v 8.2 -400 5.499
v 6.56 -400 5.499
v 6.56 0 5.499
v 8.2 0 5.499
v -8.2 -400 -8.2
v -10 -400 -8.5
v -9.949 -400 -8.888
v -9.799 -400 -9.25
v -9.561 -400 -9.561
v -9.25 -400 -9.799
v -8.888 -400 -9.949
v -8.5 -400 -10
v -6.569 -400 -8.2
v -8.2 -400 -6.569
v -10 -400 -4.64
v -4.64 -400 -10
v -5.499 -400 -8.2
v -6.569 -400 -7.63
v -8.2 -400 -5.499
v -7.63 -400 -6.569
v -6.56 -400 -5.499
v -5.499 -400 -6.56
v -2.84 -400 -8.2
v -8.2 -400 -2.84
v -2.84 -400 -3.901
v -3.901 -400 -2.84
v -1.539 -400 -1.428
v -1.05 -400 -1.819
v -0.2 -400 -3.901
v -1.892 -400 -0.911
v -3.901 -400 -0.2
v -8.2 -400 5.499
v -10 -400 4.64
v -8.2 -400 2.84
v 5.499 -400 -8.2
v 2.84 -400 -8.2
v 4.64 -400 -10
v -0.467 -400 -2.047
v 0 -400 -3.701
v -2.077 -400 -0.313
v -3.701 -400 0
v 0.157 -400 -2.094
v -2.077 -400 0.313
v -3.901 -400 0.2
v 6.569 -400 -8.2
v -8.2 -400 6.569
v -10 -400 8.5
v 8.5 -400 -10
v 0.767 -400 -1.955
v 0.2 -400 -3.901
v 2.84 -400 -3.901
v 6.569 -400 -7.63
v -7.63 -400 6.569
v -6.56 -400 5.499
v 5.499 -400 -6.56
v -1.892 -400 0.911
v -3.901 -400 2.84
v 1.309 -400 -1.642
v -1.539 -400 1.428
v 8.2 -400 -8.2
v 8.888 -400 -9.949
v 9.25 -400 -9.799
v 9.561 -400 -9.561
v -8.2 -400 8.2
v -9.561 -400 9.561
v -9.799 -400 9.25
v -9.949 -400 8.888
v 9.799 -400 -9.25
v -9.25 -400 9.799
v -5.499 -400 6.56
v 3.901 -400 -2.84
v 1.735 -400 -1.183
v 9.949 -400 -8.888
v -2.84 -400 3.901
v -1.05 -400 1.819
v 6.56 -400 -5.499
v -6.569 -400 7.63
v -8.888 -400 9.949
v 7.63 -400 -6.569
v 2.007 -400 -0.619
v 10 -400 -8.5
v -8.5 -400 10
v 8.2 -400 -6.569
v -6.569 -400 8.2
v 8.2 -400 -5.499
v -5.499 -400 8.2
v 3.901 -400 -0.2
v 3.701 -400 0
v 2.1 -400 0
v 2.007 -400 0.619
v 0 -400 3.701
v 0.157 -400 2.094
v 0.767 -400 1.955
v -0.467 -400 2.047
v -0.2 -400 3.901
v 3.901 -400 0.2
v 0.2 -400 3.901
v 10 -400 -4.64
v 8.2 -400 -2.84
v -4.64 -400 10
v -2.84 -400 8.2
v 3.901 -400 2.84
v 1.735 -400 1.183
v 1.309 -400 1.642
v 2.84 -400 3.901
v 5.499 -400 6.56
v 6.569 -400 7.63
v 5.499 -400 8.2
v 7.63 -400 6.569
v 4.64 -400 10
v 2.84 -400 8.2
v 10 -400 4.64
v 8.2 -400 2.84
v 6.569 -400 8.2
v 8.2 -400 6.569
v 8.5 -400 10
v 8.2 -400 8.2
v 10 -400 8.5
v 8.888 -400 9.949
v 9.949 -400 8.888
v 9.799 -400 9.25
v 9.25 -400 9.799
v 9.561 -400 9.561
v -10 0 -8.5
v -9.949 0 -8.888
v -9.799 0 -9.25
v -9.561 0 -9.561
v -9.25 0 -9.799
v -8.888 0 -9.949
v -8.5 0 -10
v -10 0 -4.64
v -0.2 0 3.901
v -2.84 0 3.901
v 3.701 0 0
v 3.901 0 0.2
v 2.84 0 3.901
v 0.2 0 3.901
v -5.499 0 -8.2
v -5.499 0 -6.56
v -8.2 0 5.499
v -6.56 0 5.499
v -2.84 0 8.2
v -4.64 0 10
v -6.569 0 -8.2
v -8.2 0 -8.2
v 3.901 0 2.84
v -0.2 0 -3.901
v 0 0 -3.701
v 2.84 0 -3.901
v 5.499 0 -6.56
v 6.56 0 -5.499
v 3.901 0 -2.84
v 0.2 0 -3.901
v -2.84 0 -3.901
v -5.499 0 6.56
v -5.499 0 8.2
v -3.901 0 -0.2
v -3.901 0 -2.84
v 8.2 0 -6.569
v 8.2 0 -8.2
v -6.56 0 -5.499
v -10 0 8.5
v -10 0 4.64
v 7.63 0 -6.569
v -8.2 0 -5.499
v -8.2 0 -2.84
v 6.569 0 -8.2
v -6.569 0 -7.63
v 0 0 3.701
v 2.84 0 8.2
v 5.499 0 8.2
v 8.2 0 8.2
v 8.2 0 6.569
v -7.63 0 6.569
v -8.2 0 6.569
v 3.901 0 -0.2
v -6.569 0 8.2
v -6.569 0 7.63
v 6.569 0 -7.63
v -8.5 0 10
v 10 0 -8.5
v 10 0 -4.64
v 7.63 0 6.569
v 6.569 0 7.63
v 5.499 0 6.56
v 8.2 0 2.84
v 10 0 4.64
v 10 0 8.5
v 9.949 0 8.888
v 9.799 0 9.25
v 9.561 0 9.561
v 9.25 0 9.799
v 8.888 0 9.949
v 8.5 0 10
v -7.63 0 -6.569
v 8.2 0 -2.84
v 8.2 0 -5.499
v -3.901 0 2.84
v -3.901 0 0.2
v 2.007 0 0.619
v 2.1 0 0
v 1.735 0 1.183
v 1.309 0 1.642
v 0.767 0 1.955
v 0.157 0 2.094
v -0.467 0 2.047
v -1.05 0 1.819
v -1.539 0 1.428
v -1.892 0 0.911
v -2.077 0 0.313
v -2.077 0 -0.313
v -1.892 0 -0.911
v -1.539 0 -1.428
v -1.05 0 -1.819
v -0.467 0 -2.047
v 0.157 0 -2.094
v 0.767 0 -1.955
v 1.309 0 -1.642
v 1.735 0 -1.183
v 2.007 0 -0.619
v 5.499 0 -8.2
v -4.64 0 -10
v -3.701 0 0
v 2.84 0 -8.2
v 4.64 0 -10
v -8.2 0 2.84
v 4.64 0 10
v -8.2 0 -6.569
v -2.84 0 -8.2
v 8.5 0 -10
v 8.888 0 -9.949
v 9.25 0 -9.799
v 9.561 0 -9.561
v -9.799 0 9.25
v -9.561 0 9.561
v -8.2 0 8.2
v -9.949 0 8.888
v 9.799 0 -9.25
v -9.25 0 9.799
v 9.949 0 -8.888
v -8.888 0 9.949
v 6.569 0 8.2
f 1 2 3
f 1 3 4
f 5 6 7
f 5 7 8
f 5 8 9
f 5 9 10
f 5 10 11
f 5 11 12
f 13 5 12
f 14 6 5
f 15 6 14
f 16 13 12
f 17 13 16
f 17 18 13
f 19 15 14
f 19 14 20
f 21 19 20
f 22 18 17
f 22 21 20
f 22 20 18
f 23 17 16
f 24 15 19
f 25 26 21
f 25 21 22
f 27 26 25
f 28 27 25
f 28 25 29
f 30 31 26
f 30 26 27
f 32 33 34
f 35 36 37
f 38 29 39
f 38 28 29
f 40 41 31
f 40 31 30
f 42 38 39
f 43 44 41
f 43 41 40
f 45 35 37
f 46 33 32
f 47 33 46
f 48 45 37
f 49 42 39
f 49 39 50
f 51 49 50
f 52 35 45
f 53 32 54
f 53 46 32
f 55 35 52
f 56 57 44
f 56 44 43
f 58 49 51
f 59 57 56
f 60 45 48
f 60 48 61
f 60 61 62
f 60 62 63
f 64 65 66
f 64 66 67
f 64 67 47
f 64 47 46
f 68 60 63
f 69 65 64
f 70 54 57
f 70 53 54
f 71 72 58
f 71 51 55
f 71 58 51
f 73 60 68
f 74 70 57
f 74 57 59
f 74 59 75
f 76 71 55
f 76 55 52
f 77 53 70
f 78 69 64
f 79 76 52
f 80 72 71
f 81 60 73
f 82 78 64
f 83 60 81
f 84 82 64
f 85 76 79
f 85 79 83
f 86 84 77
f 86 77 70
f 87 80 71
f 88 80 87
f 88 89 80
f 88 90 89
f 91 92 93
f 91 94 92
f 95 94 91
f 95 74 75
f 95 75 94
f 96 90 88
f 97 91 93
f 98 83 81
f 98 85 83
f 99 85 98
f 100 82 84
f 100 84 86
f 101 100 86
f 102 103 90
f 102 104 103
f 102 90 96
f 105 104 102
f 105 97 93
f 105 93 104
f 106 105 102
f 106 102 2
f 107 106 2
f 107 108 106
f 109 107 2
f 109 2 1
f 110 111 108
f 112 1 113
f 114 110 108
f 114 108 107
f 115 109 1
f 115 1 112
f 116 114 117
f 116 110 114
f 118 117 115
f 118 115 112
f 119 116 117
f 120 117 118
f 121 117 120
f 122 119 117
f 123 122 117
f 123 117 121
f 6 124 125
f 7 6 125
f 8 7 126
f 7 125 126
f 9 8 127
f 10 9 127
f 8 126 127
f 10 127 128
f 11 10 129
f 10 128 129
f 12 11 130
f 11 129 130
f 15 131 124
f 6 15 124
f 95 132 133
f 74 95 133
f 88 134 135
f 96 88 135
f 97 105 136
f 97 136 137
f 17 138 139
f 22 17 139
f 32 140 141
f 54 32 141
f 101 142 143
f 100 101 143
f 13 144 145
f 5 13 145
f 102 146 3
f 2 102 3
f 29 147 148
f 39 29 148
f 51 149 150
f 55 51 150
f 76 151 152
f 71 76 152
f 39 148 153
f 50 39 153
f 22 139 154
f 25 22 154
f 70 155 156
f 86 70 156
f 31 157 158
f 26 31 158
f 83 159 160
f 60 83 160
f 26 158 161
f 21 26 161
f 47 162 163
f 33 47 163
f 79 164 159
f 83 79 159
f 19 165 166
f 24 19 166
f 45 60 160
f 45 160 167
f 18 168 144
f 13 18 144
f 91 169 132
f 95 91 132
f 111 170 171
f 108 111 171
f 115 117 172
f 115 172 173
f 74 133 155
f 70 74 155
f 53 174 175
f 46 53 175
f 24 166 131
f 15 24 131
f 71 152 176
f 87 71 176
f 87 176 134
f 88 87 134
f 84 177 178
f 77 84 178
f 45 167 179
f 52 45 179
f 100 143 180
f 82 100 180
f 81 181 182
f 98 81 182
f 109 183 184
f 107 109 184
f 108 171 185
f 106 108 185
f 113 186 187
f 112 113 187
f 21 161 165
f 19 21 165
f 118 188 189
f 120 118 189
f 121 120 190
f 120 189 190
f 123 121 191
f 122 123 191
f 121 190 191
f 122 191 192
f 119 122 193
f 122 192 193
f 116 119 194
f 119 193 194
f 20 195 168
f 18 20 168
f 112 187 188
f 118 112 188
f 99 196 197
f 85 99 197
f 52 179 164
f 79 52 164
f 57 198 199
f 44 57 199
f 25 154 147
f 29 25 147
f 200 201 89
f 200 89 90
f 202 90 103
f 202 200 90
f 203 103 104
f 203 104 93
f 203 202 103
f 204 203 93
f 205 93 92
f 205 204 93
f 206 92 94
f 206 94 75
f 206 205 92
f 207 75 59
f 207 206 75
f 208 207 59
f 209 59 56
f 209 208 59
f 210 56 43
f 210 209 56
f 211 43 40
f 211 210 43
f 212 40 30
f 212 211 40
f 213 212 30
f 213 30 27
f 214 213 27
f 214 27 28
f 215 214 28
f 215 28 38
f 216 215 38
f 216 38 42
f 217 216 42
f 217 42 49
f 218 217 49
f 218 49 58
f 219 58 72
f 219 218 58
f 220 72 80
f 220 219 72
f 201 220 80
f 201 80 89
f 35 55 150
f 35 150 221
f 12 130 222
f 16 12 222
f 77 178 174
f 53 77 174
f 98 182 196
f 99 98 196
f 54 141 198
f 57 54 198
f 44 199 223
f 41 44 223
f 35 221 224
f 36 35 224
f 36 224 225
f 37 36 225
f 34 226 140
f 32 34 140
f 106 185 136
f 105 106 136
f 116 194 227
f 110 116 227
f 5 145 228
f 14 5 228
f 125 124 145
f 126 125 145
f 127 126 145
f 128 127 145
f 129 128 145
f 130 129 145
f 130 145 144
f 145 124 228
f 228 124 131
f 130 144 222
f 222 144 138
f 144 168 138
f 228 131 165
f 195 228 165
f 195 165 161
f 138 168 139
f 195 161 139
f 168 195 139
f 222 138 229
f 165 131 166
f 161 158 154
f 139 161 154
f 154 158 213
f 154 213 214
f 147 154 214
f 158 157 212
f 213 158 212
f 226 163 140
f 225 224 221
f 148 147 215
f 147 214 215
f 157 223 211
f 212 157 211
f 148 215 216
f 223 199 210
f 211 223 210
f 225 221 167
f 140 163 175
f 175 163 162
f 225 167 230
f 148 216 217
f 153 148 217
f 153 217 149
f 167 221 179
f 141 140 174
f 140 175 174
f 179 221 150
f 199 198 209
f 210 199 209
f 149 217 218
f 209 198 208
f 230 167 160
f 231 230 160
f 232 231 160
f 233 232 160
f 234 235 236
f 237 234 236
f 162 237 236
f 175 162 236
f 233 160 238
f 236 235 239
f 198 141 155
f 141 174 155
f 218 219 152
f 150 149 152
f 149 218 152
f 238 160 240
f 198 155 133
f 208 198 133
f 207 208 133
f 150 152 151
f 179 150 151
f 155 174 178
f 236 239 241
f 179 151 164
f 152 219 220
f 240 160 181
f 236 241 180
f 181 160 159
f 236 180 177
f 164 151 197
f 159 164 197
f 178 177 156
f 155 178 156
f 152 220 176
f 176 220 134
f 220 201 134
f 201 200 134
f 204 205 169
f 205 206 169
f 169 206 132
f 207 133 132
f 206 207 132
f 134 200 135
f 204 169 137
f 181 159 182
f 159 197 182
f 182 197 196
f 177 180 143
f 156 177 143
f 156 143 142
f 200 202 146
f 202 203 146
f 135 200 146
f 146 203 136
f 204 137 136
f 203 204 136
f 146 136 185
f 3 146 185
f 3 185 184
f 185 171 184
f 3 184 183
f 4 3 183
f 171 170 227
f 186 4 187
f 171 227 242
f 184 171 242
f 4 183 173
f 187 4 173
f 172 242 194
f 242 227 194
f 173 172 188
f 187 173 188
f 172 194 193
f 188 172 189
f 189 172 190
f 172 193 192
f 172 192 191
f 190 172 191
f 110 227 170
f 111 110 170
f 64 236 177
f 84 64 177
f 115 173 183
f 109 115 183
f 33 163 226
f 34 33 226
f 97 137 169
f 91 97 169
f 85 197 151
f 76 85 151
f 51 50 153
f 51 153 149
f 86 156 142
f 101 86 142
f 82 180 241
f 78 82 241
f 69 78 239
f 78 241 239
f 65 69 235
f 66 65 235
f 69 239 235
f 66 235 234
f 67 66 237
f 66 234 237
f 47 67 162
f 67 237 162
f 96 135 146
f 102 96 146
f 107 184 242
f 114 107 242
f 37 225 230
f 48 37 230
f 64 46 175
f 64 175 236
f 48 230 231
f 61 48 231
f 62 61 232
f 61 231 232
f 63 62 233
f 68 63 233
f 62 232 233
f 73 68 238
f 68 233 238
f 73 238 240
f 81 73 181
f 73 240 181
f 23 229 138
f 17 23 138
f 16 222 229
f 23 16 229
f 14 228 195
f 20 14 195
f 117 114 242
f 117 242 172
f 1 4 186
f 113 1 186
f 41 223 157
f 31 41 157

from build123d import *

# Parameters (mm, degrees)
F0_R     = 2.09999979
F1_DEPTH = 400


# Not quite as in the source:
# - ends of sketch curves that miss each other by under 0.0002 mm in the source are joined


with BuildPart() as f1:
    # F0 (on Front) → F1 (new body)
    with BuildSketch(Plane.XZ):
        with BuildLine():
            Line((-4.639999536, 10), (-8.50000015, 10))
            ThreePointArc((-8.50000015, 10), (-9.5606602157, 9.5606602157), (-10, 8.50000015))
            Line((-10, 8.50000015), (-10, 4.639999536))
            Line((-10, 4.639999536), (-8.19999818, 2.839999716))
            Line((-8.19999818, 2.839999716), (-8.19999818, 5.4993384501))
            Line((-8.19999818, 5.4993384501), (-6.559999344, 5.4993384501))
            Line((-6.559999344, 5.4993384501), (-3.9006596099, 2.839999716))
            Line((-3.9006596099, 2.839999716), (-3.9006596099, 0.19999898))
            Line((-3.9006596099, 0.19999898), (-3.7006596299, -1e-06))
            Line((-3.7006596299, -1e-06), (-3.9006596099, -0.20000098))
            Line((-3.9006596099, -0.20000098), (-3.9006596099, -2.840000716))
            Line((-3.9006596099, -2.840000716), (-6.559999344, -5.4993404501))
            Line((-6.559999344, -5.4993404501), (-8.19999818, -5.4993404501))
            Line((-8.19999818, -5.4993404501), (-8.19999818, -2.840000716))
            Line((-8.19999818, -2.840000716), (-10, -4.640000536))
            Line((-10, -4.640000536), (-10, -8.50000115))
            ThreePointArc((-10, -8.50000115), (-9.5606602157, -9.5606612157), (-8.50000015, -10.000001))
            Line((-8.50000015, -10.000001), (-4.639999536, -10))
            Line((-4.639999536, -10), (-2.839999716, -8.20000018))
            Line((-2.839999716, -8.20000018), (-5.4993394501, -8.20000018))
            Line((-5.4993394501, -8.20000018), (-5.4993394501, -6.560000344))
            Line((-5.4993394501, -6.560000344), (-2.839999716, -3.9006606099))
            Line((-2.839999716, -3.9006606099), (-0.19999898, -3.9006606099))
            Line((-0.19999898, -3.9006606099), (1e-06, -3.7006606299))
            Line((1e-06, -3.7006606299), (0.20000098, -3.9006606099))
            Line((0.20000098, -3.9006606099), (2.839999716, -3.9006606099))
            Line((2.839999716, -3.9006606099), (5.4993414501, -6.560000344))
            Line((5.4993414501, -6.560000344), (5.4993414501, -8.20000018))
            Line((5.4993414501, -8.20000018), (2.839999716, -8.20000018))
            Line((2.839999716, -8.20000018), (4.639999536, -10))
            Line((4.639999536, -10), (8.50000015, -10))
            ThreePointArc((8.50000015, -10), (9.5606602157, -9.5606612157), (10, -8.50000115))
            Line((10, -8.50000115), (10, -4.640000536))
            Line((10, -4.640000536), (8.20000018, -2.840000716))
            Line((8.20000018, -2.840000716), (8.20000018, -5.4993404501))
            Line((8.20000018, -5.4993404501), (6.560000344, -5.4993404501))
            Line((6.560000344, -5.4993404501), (3.9006596099, -2.840000716))
            Line((3.9006596099, -2.840000716), (3.9006596099, -0.20000098))
            Line((3.9006596099, -0.20000098), (3.7006596299, -1e-06))
            Line((3.7006596299, -1e-06), (3.9006596099, 0.19999898))
            Line((3.9006596099, 0.19999898), (3.9006596099, 2.839999716))
            Line((3.9006596099, 2.839999716), (6.560000344, 5.4993384501))
            Line((6.560000344, 5.4993384501), (8.20000018, 5.4993384501))
            Line((8.20000018, 5.4993384501), (8.20000018, 2.839999716))
            Line((8.20000018, 2.839999716), (10, 4.639999536))
            Line((10, 4.639999536), (10, 8.50000015))
            ThreePointArc((10, 8.50000015), (9.5606602157, 9.5606602157), (8.50000015, 10))
            Line((8.50000015, 10), (4.639999536, 10))
            Line((4.639999536, 10), (2.839999716, 8.20000018))
            Line((2.839999716, 8.20000018), (5.4993414501, 8.20000018))
            Line((5.4993414501, 8.20000018), (5.4993414501, 6.559998344))
            Line((5.4993414501, 6.559998344), (2.839999716, 3.9006596099))
            Line((2.839999716, 3.9006596099), (0.20000098, 3.9006596099))
            Line((0.20000098, 3.9006596099), (1e-06, 3.7006596299))
            Line((1e-06, 3.7006596299), (-0.19999898, 3.9006596099))
            Line((-0.19999898, 3.9006596099), (-2.839999716, 3.9006596099))
            Line((-2.839999716, 3.9006596099), (-5.4993394501, 6.559998344))
            Line((-5.4993394501, 6.559998344), (-5.4993394501, 8.20000018))
            Line((-5.4993394501, 8.20000018), (-2.839999716, 8.20000018))
            Line((-2.839999716, 8.20000018), (-4.639999536, 10))
        make_face()
        Polygon((-6.5693393431, -8.20000018), (-8.19999818, -8.20000018), (-8.19999818, -6.5693403431), (-7.629998237, -6.5693403431), (-6.5693393431, -7.630000237), align=None, mode=Mode.SUBTRACT)
        Polygon((8.20000018, -8.20000018), (6.5693393431, -8.20000018), (6.5693393431, -7.630000237), (7.630002237, -6.5693403431), (8.20000018, -6.5693403431), align=None, mode=Mode.SUBTRACT)
        with Locations((1e-06, -1e-06)):
            Circle(F0_R, mode=Mode.SUBTRACT)
        Polygon((-8.19999818, 8.20000018), (-6.5693393431, 8.20000018), (-6.5693393431, 7.629999237), (-7.629998237, 6.5693393431), (-8.19999818, 6.5693393431), align=None, mode=Mode.SUBTRACT)
        Polygon((6.5693393431, 8.20000018), (8.20000018, 8.20000018), (8.20000018, 6.5693393431), (7.630002237, 6.5693393431), (6.5693393431, 7.629999237), align=None, mode=Mode.SUBTRACT)
    extrude(amount=F1_DEPTH)


solid = f1.part
